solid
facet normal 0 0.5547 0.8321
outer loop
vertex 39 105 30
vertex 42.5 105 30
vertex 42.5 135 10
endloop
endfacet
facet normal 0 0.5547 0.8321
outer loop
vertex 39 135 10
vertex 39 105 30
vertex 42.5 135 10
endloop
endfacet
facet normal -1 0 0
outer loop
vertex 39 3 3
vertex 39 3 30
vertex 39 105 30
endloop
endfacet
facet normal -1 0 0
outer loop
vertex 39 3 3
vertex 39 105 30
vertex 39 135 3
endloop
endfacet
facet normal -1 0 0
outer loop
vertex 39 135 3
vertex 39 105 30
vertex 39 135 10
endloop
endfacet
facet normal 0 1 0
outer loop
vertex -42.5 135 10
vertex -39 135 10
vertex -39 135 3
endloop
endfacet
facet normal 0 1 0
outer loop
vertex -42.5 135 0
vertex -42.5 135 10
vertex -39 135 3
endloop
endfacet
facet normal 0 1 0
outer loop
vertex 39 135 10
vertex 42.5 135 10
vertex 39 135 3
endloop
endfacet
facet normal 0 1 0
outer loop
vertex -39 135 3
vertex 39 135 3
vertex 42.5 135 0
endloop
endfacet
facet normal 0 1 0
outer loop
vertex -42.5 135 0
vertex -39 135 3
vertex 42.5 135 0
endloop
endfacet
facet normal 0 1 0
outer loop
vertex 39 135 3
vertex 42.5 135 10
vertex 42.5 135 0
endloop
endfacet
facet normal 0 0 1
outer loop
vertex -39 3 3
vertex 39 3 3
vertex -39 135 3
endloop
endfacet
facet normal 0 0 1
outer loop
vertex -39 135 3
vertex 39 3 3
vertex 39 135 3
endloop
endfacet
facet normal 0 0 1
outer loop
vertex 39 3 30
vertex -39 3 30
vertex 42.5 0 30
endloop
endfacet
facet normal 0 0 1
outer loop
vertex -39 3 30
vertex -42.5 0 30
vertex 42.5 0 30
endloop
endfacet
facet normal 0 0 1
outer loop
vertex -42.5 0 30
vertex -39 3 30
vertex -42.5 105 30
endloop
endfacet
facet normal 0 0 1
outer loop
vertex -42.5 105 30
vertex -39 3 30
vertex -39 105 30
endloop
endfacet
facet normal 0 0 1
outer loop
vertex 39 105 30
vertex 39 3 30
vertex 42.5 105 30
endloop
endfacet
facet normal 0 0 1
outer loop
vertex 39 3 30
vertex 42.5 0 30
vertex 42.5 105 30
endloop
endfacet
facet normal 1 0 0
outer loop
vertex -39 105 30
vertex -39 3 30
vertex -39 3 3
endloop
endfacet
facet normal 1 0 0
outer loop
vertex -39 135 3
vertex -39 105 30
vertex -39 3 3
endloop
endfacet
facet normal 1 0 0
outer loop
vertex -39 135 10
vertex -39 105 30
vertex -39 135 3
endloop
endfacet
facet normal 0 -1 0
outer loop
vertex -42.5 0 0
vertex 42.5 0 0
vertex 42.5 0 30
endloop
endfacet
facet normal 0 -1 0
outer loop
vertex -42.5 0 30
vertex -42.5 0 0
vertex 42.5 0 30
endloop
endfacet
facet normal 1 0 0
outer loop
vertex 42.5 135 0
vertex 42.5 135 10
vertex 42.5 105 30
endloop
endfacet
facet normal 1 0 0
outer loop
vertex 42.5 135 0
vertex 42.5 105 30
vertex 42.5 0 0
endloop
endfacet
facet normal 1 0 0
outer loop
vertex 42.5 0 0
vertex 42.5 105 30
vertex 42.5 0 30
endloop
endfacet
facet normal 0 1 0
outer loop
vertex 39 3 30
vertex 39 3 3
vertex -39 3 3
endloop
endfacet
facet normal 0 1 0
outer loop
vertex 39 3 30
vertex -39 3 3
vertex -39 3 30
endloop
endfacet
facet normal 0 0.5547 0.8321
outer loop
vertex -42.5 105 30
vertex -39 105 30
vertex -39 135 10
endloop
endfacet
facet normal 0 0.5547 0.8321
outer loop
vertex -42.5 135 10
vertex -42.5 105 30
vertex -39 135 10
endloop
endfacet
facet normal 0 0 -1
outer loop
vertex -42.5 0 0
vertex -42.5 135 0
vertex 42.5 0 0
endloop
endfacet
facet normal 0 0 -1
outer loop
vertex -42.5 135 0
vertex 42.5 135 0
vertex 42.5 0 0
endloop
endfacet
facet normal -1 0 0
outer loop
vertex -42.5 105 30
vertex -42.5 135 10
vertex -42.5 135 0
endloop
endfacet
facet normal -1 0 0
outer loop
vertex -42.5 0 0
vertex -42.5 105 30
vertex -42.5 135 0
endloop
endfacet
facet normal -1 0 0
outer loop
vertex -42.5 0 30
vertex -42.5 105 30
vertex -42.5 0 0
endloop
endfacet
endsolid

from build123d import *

# Parameters (mm, degrees)
PAD_DEPTH    = 42.5
SKETCH001_W  = 150
SKETCH001_H  = 50
POCKET_DEPTH = 39


with BuildPart() as part:
    # Sketch → Pad (new body, symmetric)
    with BuildSketch(Plane.YZ):
        Polygon((105, 30), (135, 10), (135, 0), (0, 0), (0, 30), align=None)
    extrude(amount=PAD_DEPTH, both=True)

    # Sketch001 → Pocket (cut, symmetric)
    with BuildSketch(Plane.YZ):
        with Locations((78, 28)):
            Rectangle(SKETCH001_W, SKETCH001_H)
    extrude(amount=POCKET_DEPTH, both=True, mode=Mode.SUBTRACT)


solid = part.part
